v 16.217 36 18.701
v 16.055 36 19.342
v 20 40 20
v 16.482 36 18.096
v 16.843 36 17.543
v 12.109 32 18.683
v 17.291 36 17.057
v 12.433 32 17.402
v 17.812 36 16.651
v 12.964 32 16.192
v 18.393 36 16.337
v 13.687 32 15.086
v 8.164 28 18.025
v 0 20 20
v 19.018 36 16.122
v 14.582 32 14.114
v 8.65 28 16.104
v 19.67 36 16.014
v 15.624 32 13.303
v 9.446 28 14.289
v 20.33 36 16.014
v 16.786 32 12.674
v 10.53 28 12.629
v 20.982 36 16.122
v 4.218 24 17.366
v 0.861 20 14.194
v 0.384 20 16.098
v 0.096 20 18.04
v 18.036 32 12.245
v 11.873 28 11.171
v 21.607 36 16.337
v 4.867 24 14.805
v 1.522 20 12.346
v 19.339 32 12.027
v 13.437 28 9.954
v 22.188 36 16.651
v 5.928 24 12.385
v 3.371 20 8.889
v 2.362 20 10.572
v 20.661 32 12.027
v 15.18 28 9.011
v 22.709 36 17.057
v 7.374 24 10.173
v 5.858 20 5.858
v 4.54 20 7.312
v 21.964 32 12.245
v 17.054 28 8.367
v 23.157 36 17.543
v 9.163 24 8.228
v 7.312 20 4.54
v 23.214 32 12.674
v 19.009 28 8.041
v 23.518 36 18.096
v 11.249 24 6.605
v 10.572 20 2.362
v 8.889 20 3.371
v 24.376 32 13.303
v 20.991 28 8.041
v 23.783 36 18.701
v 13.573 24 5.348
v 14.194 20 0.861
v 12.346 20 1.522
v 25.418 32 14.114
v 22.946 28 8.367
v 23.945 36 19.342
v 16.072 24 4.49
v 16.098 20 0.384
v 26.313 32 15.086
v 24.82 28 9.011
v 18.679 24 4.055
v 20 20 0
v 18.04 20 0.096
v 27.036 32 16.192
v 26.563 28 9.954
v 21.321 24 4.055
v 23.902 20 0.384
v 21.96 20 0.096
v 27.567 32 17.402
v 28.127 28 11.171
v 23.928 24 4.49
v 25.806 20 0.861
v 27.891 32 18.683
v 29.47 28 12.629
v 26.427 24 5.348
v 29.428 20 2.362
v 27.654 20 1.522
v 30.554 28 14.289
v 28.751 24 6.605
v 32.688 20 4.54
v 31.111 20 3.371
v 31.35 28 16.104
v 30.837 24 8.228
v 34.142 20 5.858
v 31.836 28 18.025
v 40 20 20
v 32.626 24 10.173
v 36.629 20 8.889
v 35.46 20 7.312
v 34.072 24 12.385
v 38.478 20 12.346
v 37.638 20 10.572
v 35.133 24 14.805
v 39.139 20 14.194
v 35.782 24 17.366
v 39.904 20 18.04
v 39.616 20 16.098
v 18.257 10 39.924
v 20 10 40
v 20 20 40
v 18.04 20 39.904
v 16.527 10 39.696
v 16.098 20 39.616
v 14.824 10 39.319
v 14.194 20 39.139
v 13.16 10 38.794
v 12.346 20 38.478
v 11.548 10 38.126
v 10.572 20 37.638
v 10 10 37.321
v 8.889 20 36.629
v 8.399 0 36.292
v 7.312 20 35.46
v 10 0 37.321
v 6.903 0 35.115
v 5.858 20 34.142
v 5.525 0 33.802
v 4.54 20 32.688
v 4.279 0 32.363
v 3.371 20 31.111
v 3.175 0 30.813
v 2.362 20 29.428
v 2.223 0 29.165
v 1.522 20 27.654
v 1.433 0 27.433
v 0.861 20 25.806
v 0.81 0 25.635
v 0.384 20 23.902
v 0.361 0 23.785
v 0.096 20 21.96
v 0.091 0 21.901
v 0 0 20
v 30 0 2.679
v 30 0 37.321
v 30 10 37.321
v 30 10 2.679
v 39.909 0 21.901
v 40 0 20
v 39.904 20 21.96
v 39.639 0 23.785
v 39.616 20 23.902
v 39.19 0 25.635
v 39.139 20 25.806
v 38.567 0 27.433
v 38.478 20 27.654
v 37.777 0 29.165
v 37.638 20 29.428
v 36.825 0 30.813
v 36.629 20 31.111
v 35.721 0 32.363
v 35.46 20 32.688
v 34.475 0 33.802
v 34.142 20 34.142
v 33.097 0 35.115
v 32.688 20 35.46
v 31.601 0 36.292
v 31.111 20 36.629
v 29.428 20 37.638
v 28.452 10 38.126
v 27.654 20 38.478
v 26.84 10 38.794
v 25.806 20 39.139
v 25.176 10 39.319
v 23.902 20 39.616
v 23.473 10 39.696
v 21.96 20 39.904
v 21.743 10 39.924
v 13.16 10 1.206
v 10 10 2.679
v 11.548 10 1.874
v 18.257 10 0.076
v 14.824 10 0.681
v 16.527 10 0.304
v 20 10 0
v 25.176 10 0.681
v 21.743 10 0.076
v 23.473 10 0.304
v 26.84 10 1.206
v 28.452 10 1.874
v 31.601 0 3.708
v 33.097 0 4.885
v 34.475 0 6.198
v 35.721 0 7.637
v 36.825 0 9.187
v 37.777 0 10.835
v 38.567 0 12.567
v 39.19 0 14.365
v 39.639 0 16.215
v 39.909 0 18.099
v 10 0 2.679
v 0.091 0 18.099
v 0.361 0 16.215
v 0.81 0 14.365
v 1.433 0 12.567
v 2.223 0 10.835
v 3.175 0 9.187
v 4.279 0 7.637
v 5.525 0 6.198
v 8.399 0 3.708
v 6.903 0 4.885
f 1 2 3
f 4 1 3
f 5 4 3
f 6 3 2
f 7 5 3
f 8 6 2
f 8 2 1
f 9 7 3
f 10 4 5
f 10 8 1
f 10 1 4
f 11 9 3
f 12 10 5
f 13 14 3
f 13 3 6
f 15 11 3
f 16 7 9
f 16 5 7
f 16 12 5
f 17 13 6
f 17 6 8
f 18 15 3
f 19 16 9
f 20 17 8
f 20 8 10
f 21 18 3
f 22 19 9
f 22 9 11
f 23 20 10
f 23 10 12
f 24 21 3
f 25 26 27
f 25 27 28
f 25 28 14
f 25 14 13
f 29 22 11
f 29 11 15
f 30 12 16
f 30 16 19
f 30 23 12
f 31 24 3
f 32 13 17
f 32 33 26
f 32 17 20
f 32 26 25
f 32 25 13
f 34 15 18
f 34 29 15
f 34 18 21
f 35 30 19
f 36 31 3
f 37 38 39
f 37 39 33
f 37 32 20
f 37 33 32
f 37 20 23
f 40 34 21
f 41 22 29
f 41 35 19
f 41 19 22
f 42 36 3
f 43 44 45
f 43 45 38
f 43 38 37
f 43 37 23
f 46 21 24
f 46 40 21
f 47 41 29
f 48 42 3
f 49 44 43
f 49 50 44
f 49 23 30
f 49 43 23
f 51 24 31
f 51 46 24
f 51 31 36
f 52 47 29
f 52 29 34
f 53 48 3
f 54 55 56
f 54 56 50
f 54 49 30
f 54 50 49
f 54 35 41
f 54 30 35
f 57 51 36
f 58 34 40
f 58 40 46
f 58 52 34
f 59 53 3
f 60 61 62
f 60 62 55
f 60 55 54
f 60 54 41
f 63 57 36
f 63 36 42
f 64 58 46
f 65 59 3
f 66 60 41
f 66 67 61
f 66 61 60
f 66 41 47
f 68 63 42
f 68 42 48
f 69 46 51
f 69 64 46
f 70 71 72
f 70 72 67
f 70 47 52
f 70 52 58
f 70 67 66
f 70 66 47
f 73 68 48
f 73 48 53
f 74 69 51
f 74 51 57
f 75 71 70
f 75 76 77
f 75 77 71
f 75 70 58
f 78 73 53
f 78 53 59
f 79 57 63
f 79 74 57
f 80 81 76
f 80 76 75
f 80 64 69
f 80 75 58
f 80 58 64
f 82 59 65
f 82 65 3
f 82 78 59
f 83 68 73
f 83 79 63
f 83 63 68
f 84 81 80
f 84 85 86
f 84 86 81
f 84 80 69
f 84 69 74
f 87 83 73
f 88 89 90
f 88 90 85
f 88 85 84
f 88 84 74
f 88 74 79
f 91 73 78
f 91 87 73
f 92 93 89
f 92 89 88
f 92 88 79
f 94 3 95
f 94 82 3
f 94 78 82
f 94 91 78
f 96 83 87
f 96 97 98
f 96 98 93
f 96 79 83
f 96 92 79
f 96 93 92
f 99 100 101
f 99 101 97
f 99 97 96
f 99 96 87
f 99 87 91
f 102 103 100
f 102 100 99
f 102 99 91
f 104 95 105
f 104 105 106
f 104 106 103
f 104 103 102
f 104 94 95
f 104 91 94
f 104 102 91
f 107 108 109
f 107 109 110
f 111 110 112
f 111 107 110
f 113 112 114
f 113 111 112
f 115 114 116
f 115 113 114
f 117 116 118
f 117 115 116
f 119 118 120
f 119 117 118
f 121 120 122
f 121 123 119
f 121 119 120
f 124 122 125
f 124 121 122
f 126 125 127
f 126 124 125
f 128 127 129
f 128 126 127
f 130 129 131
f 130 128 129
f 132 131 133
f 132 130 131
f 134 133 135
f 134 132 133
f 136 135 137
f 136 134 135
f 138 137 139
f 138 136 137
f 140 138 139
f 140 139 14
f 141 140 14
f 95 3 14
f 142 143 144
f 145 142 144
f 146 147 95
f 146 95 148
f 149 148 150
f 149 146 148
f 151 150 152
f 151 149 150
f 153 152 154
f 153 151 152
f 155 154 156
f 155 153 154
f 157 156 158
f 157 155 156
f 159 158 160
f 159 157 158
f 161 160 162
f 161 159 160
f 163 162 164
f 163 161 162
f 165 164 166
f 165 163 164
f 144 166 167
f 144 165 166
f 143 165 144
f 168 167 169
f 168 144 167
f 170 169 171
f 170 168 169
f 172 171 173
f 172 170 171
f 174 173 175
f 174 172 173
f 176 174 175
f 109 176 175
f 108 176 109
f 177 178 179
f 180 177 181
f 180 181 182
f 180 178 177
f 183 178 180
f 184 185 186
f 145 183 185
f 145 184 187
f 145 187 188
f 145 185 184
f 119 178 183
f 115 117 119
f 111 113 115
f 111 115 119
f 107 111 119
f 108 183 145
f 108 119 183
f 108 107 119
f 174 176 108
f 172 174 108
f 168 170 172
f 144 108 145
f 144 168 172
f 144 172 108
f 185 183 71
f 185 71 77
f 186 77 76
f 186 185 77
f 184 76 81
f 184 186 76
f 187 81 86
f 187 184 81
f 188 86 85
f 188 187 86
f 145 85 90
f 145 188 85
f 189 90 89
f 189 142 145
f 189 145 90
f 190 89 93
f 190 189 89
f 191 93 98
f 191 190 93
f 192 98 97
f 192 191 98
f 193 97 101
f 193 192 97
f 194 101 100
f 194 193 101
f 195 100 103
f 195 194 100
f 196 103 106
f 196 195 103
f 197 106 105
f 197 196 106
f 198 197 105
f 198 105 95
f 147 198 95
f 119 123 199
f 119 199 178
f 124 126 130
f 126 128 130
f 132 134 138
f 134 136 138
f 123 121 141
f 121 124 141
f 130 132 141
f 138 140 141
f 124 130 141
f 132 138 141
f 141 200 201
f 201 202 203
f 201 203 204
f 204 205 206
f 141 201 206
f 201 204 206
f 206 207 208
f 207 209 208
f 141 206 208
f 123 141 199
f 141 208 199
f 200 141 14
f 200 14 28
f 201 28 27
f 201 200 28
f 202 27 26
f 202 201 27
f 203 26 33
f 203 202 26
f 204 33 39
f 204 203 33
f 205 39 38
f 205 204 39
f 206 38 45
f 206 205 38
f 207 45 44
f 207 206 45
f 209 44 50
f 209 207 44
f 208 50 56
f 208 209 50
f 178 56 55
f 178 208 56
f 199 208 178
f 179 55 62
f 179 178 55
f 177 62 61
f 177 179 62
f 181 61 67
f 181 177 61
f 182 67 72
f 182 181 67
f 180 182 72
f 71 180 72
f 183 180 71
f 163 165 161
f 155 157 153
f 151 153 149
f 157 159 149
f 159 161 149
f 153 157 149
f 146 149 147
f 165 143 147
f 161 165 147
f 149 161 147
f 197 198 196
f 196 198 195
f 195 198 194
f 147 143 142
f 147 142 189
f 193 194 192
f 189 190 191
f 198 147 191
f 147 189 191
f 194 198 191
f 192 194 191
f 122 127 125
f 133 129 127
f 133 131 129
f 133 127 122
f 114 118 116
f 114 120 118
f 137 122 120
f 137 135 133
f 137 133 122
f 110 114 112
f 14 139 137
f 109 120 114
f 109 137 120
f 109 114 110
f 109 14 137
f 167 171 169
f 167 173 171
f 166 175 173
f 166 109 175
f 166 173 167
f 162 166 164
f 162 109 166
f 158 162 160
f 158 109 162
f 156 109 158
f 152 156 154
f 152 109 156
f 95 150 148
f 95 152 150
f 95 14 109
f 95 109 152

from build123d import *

# Parameters (mm, degrees)
SKETCH1_W           = 40
SKETCH1_H           = 40
BOSS_EXTRUDE1_DEPTH = 40
SKETCH2_W           = 20
SKETCH2_H           = 10
CUT_EXTRUDE1_DEPTH  = 40
CUT_EXTRUDE2_DEPTH  = 40
SKETCH4_W           = 20
SKETCH4_H           = 20
CUT_EXTRUDE5_DEPTH  = 40
SKETCH5_R           = 20
CUT_EXTRUDE6_DEPTH  = 30
REVOLVE1_ANGLE      = 180


with BuildPart() as part:
    # Sketch1 → Boss-Extrude1 (new body)
    with BuildSketch(Plane.XY):
        with Locations((20, 20)):
            Rectangle(SKETCH1_W, SKETCH1_H)
    extrude(amount=BOSS_EXTRUDE1_DEPTH)

    # Sketch2 → Cut-Extrude1 (cut)
    with BuildSketch(Plane.XY.offset(40)):
        with Locations((20, 5)):
            Rectangle(SKETCH2_W, SKETCH2_H)
        Polygon((0, 40), (0, 20), (20, 40), align=None)
        Polygon((20, 40), (40, 20), (40, 40), align=None)
    extrude(amount=-CUT_EXTRUDE1_DEPTH, mode=Mode.SUBTRACT)

    # Sketch3 → Cut-Extrude2 (cut)
    with BuildSketch(Plane(origin=(0, 0, 0), x_dir=(1, 0, 0), z_dir=(0, 1, 0))):
        with BuildLine():
            Line((20, 0), (0, 0))
            Line((0, 0), (0, -20))
            ThreePointArc((0, -20), (5.857864376, -5.857864376), (20, 0))
        make_face()
        with BuildLine():
            Line((40, 0), (20, 0))
            ThreePointArc((20, 0), (34.142135624, -5.857864376), (40, -20))
            Line((40, -20), (40, 0))
        make_face()
        with BuildLine():
            Line((40, -40), (40, -20))
            ThreePointArc((40, -20), (34.142135624, -34.142135624), (20, -40))
            Line((20, -40), (40, -40))
        make_face()
        with BuildLine():
            ThreePointArc((20, -40), (5.857864376, -34.142135624), (0, -20))
            Line((0, -20), (0, -40))
            Line((0, -40), (20, -40))
        make_face()
    extrude(amount=CUT_EXTRUDE2_DEPTH, mode=Mode.SUBTRACT)

    # Sketch4 → Cut-Extrude5 (cut)
    with BuildSketch(Plane(origin=(0, 0, 0), x_dir=(0, 0, -1), z_dir=(1, 0, 0))):
        Polygon((0, 40), (0, 20), (-20, 40), align=None)
        with Locations((-30, 30)):
            Rectangle(SKETCH4_W, SKETCH4_H)
    extrude(amount=CUT_EXTRUDE5_DEPTH, mode=Mode.SUBTRACT)

    # Sketch5 → Cut-Extrude6 (cut)
    with BuildSketch(Plane(origin=(0, 20, 0), x_dir=(1, 0, 0), z_dir=(0, 1, 0))):
        with Locations((20, -20)):
            Circle(SKETCH5_R)
    extrude(amount=CUT_EXTRUDE6_DEPTH, mode=Mode.SUBTRACT)

    # Sketch6 → Revolve1 (revolve)
    with BuildSketch(Plane.XY.offset(20)):
        Polygon((20, 20), (20, 40), (0, 20), align=None)
    revolve(axis=Axis((20, 20, 20), (0, -1, 0)), revolution_arc=REVOLVE1_ANGLE)


solid = part.part
